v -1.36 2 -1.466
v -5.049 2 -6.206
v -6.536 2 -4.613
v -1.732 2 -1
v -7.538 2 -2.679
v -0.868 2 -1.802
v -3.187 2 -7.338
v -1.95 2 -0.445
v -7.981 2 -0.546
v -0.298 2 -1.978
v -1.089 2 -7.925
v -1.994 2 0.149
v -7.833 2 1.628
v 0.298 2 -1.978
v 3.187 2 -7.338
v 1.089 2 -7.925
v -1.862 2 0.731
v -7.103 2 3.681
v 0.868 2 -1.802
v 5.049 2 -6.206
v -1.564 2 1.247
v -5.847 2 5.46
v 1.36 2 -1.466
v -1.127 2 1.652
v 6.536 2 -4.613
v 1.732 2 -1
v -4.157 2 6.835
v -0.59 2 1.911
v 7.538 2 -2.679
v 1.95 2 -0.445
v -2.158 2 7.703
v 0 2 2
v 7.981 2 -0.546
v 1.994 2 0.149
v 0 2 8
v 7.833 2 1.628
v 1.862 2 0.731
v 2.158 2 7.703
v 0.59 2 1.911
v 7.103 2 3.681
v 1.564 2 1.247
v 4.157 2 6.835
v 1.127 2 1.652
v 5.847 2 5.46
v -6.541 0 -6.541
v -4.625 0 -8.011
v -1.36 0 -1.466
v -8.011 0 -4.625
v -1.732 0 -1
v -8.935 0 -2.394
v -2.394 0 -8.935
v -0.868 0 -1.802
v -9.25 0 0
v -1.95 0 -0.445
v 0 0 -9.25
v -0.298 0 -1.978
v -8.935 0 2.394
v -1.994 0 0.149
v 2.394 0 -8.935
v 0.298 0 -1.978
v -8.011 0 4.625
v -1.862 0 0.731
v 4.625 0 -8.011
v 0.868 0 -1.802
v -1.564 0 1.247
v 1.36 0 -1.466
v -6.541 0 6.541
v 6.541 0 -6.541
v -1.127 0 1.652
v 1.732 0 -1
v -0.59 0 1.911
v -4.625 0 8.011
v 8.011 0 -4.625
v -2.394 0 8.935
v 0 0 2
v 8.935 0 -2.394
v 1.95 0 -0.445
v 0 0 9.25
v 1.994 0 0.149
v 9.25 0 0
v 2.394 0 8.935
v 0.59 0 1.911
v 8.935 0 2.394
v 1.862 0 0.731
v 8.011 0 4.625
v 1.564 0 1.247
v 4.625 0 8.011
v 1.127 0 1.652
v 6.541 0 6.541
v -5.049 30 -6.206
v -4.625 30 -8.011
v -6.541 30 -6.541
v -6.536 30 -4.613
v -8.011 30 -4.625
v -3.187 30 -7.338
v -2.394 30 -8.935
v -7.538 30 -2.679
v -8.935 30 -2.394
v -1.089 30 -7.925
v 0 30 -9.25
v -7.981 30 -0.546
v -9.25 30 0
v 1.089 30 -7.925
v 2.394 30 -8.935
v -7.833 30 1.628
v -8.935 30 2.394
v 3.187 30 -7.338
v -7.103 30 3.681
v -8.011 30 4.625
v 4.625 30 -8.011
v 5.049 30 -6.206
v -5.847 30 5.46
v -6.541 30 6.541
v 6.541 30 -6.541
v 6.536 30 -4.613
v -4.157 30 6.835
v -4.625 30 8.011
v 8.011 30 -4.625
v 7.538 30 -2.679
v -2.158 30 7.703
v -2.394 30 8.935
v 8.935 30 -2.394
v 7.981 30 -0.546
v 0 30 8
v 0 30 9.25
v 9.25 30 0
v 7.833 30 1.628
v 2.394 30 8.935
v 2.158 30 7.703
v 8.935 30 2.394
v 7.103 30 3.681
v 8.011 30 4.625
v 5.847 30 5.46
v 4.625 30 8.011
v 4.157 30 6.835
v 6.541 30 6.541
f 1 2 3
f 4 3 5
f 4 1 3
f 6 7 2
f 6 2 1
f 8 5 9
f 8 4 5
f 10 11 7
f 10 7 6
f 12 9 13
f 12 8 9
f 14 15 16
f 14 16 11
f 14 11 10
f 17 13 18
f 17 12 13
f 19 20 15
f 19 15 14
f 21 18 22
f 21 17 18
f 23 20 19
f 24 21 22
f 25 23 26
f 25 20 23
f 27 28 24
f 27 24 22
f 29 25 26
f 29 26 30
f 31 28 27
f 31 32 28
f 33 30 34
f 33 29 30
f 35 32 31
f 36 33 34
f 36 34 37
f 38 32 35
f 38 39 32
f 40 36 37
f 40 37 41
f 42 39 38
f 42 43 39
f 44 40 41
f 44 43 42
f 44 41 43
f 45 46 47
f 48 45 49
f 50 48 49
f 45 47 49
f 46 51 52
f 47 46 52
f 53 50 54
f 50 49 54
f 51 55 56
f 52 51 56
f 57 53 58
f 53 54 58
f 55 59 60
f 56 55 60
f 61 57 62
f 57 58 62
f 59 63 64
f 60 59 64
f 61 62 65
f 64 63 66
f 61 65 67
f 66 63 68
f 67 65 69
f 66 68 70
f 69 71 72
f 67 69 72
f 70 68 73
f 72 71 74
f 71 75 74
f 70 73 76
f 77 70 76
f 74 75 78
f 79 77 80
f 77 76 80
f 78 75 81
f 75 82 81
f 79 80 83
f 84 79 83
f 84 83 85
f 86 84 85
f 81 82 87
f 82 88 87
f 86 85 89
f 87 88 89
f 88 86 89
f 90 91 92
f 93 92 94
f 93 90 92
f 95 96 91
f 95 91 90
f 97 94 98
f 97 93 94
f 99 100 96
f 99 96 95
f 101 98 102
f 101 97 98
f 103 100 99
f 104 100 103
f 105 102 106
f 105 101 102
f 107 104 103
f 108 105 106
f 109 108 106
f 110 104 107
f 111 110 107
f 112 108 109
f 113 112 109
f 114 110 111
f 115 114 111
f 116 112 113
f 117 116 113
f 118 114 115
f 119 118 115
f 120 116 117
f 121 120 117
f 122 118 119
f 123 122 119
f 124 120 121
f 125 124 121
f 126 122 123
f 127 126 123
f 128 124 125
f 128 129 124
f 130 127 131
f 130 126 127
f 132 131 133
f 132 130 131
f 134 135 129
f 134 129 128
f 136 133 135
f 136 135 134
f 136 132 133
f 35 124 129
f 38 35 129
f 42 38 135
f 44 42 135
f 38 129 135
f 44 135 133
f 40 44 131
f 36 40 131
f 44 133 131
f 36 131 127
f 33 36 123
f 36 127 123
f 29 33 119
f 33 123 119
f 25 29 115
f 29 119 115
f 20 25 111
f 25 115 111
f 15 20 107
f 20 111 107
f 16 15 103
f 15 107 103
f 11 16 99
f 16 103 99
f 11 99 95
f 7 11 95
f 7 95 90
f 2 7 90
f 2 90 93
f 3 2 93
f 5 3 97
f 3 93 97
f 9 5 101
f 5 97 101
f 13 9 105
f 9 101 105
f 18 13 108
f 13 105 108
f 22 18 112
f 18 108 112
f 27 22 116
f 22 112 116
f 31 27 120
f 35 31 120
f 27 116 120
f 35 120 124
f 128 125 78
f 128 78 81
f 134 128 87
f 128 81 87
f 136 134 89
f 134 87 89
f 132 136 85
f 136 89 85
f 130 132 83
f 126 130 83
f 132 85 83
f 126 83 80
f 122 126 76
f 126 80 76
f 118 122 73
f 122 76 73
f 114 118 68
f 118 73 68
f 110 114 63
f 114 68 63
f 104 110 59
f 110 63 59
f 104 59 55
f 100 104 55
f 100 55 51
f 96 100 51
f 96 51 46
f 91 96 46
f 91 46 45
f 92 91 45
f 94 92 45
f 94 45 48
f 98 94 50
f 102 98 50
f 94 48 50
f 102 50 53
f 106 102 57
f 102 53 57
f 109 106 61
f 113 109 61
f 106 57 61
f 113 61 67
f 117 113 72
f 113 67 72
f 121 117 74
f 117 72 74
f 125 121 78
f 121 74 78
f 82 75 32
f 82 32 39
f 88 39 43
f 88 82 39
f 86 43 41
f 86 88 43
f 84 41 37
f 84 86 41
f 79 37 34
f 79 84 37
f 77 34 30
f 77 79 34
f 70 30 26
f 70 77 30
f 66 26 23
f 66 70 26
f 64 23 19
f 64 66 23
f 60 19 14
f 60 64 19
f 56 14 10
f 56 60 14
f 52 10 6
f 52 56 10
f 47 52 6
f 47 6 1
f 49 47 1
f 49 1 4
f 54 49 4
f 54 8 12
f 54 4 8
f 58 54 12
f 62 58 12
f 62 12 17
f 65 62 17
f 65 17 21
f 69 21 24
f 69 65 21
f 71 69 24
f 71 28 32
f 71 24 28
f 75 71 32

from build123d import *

# Parameters (mm, degrees)
SKETCH1_R               = 9.25
BOSS_EXTRUDE1_DEPTH     = 30
CUT_EXTRUDE1_START      = 30
SKETCH1_3_R             = 8
CUT_EXTRUDE1_DEPTH      = 28
CUT_EXTRUDE3_DEPTH      = 33.728046077
CUT_EXTRUDE3_DEPTH_BACK = 33.728046077
SKETCH1_4_R             = 2


with BuildPart() as part:
    # Sketch1 → Boss-Extrude1 (new body)
    with BuildSketch(Plane(origin=(0, 0, 0), x_dir=(1, 0, 0), z_dir=(0, 1, 0))):
        with Locations(Location((0, 0, 0), (0, 0, 270))):
            Circle(SKETCH1_R)
    extrude(amount=BOSS_EXTRUDE1_DEPTH)

    # Sketch1<3> → Cut-Extrude1 (cut)
    with BuildSketch(Plane(origin=(0, 0, 0), x_dir=(1, 0, 0), z_dir=(0, 1, 0)).offset(CUT_EXTRUDE1_START)):
        with Locations(Location((0, 0, 0), (0, 0, 270))):
            Circle(SKETCH1_3_R)
    extrude(amount=-CUT_EXTRUDE1_DEPTH, mode=Mode.SUBTRACT)

    # Sketch1<4> → Cut-Extrude3 (cut, two sides: drawn at the far end of the back side and taken through both)
    with BuildSketch(Plane(origin=(0, 0, 0), x_dir=(1, 0, 0), z_dir=(0, 1, 0)).offset(-CUT_EXTRUDE3_DEPTH_BACK)):
        with Locations(Location((0, 0, 0), (0, 0, 270))):
            Circle(SKETCH1_4_R)
    extrude(amount=CUT_EXTRUDE3_DEPTH + CUT_EXTRUDE3_DEPTH_BACK, mode=Mode.SUBTRACT)


solid = part.part
